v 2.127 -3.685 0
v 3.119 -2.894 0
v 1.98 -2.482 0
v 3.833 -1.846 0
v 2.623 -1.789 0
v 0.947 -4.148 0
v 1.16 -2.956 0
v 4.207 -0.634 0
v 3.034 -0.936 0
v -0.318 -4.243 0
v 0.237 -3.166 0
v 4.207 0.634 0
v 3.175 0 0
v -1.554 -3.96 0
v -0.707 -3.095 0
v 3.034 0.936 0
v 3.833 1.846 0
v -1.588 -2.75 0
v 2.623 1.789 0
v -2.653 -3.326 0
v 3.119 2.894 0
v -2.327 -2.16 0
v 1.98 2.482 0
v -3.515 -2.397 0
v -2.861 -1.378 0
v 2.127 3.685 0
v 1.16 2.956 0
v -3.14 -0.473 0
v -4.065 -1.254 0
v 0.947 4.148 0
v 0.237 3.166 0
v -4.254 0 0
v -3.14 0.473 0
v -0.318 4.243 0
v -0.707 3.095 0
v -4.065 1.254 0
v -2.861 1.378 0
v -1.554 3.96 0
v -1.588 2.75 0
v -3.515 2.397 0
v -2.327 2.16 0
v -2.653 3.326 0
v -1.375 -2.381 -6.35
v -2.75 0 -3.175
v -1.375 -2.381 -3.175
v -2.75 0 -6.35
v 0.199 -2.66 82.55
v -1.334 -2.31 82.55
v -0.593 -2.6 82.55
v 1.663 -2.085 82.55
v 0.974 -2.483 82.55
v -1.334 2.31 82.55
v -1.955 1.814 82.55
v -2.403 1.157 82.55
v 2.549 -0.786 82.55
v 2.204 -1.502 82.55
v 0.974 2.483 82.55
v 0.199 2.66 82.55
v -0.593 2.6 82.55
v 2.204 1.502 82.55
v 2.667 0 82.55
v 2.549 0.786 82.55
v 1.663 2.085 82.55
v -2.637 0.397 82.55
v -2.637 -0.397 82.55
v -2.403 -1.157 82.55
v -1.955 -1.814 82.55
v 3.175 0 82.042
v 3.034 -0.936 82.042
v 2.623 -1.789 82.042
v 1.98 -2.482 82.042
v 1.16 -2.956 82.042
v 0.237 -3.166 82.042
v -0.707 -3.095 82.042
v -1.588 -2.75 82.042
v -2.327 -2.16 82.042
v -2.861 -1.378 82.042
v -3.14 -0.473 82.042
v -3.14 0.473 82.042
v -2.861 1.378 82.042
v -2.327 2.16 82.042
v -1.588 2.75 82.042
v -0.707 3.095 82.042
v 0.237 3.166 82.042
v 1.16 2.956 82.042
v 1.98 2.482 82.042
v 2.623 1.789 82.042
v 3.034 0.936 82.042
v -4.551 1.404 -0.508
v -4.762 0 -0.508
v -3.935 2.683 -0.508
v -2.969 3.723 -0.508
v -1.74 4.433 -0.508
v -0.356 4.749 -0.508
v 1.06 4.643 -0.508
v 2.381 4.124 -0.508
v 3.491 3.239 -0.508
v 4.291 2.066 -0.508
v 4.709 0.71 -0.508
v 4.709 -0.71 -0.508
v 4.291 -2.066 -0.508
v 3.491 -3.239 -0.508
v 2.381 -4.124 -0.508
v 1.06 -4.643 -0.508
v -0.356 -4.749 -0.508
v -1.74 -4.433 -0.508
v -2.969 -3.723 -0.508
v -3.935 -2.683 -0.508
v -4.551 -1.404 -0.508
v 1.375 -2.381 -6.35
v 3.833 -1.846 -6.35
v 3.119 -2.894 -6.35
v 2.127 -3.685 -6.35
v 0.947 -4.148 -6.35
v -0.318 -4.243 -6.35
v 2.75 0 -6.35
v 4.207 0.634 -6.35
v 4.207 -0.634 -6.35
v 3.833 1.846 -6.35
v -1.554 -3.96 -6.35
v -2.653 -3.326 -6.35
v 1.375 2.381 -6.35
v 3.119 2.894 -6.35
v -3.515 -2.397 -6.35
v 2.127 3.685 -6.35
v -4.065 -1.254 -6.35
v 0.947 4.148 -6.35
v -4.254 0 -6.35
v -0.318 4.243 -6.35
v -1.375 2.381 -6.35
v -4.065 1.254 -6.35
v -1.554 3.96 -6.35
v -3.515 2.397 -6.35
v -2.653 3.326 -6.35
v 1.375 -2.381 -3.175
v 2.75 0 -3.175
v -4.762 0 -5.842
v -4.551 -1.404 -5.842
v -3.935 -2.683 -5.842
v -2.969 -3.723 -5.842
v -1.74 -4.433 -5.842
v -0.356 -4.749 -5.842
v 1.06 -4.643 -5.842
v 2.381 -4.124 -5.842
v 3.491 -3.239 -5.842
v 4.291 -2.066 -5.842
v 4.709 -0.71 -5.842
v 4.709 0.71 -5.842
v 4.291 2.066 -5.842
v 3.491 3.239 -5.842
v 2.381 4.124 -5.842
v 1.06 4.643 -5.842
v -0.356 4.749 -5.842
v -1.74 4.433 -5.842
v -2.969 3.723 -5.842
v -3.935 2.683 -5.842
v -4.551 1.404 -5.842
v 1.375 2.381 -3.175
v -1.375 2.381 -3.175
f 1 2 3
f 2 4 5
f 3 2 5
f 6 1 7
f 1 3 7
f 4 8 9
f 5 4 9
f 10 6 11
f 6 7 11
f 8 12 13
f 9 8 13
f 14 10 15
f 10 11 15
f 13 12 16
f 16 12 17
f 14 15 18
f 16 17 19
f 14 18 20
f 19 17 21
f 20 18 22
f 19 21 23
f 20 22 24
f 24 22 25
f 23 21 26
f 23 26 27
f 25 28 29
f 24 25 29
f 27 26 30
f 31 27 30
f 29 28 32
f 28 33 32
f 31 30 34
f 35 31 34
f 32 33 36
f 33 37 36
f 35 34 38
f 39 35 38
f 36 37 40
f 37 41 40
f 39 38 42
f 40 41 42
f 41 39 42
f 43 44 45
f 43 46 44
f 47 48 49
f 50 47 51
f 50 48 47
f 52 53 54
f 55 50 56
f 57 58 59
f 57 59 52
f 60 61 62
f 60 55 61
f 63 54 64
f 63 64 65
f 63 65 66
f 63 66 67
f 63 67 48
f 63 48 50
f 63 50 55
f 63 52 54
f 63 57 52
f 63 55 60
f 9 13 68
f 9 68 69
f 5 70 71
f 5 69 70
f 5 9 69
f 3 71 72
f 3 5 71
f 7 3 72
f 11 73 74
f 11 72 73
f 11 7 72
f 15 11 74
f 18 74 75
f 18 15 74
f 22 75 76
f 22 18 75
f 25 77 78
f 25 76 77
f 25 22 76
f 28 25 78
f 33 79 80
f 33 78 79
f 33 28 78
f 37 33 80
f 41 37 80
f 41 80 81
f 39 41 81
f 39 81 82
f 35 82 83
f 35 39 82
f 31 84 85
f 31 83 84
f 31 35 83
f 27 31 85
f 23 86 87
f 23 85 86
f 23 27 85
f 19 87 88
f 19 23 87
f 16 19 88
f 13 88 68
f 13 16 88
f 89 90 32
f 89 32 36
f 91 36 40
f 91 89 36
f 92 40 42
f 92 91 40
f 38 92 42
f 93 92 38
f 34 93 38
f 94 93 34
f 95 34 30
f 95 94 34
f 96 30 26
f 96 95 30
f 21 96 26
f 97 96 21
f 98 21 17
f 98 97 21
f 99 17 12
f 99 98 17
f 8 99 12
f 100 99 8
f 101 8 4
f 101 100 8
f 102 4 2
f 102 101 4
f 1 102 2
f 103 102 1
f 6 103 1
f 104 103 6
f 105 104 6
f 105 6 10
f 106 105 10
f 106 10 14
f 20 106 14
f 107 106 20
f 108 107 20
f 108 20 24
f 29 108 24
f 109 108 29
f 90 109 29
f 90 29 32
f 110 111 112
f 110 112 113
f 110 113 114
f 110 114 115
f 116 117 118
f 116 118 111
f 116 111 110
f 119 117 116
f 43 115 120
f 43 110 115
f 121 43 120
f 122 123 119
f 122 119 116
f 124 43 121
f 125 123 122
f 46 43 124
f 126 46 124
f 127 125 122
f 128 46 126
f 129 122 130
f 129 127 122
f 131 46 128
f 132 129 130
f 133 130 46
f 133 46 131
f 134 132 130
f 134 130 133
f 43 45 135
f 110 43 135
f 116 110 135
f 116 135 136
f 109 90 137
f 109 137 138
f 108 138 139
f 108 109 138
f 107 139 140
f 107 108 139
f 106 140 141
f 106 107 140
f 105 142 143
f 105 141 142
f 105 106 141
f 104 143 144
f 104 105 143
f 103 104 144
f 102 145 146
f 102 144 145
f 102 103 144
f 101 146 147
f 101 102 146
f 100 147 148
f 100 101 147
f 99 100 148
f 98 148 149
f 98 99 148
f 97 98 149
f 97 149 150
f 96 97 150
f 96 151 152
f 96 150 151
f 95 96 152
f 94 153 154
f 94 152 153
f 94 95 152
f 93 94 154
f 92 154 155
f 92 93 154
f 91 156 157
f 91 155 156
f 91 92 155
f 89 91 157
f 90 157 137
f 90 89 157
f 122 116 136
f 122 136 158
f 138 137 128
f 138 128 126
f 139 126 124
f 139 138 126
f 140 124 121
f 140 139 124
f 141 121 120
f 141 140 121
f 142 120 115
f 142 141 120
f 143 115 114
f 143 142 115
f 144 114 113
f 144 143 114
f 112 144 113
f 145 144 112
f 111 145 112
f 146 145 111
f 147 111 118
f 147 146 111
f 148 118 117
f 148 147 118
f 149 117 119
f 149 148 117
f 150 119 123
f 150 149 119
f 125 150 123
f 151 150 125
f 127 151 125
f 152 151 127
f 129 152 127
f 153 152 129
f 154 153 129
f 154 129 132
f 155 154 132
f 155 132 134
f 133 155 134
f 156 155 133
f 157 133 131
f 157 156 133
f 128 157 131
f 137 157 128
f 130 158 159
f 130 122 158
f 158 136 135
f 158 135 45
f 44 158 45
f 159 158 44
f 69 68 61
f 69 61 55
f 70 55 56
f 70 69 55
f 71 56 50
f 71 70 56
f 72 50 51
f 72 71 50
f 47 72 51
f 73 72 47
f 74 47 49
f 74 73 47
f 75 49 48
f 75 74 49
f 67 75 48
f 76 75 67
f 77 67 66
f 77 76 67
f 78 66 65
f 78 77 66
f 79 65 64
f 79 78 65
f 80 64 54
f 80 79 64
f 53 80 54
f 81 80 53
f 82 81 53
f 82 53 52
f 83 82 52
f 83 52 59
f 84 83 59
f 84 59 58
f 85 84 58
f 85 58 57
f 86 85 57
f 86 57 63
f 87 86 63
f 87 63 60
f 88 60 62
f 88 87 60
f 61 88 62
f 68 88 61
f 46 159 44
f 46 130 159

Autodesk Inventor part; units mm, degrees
ref_plane "YZ Plane" through (0, 0, 0) normal (1, 0, 0) x (0, 1, 0)
ref_plane "XZ Plane" through (0, 0, 0) normal (0, 1, 0) x (-1, 0, 0)
ref_plane "XY Plane" through (0, 0, 0) normal (0, 0, 1) x (1, 0, 0)
sketch "Sketch1" plane through (0, 0, 0) normal (0, 0, 1) x (1, 0, 0)
  circle A0 centre (0, 0) radius 3.175
  dimension "d0" = 6.35
extrude "Extrusion1" add sketch "Sketch1" along normal blind 82.55
sketch "Sketch2" plane through (0, 0, 0) normal (0, 0, -1) x (-1, 0, 0)
  circle A0 centre (0, 0) radius 3.175 projected
  circle A1 centre (0, 0) radius 4.7625
  dimension "d3" = 9.525
extrude "Extrusion2" add sketch "Sketch2" along normal blind 6.35 contours A0 | A1
sketch "Sketch3" plane through (0, 0, -6.35) normal (0, 0, -1) x (-1, 0, 0)
  circle A0 centre (0, 0) radius 4.7625 projected
  line L0 (-1.3748, 2.3812) -> (1.3748, 2.3813)
  line L1 (1.3748, 2.3813) -> (2.7496, 0)
  line L2 (2.7496, 0) -> (1.3748, -2.3812)
  line L3 (1.3748, -2.3812) -> (-1.3748, -2.3812)
  line L4 (-1.3748, -2.3812) -> (-2.7496, 0)
  line L5 (-2.7496, 0) -> (-1.3748, 2.3812)
  dimension "d6" = 4.7625
extrude "Extrusion3" cut sketch "Sketch3" against normal blind 3.175 contours L0 L1 L2 L3 L4 L5
chamfer "Chamfer1" distance 0.508 angle 45 3 edges at (-3.175, 0, 82.55) (4.7625, 0, 0) (4.7625, 0, -6.35)
thread "Thread1" size "1/4-20 UNC" class "2A" standard "ANSI Unified Screw Threads" length 25.4
properties part number "14-20 x750" material "Steel"
